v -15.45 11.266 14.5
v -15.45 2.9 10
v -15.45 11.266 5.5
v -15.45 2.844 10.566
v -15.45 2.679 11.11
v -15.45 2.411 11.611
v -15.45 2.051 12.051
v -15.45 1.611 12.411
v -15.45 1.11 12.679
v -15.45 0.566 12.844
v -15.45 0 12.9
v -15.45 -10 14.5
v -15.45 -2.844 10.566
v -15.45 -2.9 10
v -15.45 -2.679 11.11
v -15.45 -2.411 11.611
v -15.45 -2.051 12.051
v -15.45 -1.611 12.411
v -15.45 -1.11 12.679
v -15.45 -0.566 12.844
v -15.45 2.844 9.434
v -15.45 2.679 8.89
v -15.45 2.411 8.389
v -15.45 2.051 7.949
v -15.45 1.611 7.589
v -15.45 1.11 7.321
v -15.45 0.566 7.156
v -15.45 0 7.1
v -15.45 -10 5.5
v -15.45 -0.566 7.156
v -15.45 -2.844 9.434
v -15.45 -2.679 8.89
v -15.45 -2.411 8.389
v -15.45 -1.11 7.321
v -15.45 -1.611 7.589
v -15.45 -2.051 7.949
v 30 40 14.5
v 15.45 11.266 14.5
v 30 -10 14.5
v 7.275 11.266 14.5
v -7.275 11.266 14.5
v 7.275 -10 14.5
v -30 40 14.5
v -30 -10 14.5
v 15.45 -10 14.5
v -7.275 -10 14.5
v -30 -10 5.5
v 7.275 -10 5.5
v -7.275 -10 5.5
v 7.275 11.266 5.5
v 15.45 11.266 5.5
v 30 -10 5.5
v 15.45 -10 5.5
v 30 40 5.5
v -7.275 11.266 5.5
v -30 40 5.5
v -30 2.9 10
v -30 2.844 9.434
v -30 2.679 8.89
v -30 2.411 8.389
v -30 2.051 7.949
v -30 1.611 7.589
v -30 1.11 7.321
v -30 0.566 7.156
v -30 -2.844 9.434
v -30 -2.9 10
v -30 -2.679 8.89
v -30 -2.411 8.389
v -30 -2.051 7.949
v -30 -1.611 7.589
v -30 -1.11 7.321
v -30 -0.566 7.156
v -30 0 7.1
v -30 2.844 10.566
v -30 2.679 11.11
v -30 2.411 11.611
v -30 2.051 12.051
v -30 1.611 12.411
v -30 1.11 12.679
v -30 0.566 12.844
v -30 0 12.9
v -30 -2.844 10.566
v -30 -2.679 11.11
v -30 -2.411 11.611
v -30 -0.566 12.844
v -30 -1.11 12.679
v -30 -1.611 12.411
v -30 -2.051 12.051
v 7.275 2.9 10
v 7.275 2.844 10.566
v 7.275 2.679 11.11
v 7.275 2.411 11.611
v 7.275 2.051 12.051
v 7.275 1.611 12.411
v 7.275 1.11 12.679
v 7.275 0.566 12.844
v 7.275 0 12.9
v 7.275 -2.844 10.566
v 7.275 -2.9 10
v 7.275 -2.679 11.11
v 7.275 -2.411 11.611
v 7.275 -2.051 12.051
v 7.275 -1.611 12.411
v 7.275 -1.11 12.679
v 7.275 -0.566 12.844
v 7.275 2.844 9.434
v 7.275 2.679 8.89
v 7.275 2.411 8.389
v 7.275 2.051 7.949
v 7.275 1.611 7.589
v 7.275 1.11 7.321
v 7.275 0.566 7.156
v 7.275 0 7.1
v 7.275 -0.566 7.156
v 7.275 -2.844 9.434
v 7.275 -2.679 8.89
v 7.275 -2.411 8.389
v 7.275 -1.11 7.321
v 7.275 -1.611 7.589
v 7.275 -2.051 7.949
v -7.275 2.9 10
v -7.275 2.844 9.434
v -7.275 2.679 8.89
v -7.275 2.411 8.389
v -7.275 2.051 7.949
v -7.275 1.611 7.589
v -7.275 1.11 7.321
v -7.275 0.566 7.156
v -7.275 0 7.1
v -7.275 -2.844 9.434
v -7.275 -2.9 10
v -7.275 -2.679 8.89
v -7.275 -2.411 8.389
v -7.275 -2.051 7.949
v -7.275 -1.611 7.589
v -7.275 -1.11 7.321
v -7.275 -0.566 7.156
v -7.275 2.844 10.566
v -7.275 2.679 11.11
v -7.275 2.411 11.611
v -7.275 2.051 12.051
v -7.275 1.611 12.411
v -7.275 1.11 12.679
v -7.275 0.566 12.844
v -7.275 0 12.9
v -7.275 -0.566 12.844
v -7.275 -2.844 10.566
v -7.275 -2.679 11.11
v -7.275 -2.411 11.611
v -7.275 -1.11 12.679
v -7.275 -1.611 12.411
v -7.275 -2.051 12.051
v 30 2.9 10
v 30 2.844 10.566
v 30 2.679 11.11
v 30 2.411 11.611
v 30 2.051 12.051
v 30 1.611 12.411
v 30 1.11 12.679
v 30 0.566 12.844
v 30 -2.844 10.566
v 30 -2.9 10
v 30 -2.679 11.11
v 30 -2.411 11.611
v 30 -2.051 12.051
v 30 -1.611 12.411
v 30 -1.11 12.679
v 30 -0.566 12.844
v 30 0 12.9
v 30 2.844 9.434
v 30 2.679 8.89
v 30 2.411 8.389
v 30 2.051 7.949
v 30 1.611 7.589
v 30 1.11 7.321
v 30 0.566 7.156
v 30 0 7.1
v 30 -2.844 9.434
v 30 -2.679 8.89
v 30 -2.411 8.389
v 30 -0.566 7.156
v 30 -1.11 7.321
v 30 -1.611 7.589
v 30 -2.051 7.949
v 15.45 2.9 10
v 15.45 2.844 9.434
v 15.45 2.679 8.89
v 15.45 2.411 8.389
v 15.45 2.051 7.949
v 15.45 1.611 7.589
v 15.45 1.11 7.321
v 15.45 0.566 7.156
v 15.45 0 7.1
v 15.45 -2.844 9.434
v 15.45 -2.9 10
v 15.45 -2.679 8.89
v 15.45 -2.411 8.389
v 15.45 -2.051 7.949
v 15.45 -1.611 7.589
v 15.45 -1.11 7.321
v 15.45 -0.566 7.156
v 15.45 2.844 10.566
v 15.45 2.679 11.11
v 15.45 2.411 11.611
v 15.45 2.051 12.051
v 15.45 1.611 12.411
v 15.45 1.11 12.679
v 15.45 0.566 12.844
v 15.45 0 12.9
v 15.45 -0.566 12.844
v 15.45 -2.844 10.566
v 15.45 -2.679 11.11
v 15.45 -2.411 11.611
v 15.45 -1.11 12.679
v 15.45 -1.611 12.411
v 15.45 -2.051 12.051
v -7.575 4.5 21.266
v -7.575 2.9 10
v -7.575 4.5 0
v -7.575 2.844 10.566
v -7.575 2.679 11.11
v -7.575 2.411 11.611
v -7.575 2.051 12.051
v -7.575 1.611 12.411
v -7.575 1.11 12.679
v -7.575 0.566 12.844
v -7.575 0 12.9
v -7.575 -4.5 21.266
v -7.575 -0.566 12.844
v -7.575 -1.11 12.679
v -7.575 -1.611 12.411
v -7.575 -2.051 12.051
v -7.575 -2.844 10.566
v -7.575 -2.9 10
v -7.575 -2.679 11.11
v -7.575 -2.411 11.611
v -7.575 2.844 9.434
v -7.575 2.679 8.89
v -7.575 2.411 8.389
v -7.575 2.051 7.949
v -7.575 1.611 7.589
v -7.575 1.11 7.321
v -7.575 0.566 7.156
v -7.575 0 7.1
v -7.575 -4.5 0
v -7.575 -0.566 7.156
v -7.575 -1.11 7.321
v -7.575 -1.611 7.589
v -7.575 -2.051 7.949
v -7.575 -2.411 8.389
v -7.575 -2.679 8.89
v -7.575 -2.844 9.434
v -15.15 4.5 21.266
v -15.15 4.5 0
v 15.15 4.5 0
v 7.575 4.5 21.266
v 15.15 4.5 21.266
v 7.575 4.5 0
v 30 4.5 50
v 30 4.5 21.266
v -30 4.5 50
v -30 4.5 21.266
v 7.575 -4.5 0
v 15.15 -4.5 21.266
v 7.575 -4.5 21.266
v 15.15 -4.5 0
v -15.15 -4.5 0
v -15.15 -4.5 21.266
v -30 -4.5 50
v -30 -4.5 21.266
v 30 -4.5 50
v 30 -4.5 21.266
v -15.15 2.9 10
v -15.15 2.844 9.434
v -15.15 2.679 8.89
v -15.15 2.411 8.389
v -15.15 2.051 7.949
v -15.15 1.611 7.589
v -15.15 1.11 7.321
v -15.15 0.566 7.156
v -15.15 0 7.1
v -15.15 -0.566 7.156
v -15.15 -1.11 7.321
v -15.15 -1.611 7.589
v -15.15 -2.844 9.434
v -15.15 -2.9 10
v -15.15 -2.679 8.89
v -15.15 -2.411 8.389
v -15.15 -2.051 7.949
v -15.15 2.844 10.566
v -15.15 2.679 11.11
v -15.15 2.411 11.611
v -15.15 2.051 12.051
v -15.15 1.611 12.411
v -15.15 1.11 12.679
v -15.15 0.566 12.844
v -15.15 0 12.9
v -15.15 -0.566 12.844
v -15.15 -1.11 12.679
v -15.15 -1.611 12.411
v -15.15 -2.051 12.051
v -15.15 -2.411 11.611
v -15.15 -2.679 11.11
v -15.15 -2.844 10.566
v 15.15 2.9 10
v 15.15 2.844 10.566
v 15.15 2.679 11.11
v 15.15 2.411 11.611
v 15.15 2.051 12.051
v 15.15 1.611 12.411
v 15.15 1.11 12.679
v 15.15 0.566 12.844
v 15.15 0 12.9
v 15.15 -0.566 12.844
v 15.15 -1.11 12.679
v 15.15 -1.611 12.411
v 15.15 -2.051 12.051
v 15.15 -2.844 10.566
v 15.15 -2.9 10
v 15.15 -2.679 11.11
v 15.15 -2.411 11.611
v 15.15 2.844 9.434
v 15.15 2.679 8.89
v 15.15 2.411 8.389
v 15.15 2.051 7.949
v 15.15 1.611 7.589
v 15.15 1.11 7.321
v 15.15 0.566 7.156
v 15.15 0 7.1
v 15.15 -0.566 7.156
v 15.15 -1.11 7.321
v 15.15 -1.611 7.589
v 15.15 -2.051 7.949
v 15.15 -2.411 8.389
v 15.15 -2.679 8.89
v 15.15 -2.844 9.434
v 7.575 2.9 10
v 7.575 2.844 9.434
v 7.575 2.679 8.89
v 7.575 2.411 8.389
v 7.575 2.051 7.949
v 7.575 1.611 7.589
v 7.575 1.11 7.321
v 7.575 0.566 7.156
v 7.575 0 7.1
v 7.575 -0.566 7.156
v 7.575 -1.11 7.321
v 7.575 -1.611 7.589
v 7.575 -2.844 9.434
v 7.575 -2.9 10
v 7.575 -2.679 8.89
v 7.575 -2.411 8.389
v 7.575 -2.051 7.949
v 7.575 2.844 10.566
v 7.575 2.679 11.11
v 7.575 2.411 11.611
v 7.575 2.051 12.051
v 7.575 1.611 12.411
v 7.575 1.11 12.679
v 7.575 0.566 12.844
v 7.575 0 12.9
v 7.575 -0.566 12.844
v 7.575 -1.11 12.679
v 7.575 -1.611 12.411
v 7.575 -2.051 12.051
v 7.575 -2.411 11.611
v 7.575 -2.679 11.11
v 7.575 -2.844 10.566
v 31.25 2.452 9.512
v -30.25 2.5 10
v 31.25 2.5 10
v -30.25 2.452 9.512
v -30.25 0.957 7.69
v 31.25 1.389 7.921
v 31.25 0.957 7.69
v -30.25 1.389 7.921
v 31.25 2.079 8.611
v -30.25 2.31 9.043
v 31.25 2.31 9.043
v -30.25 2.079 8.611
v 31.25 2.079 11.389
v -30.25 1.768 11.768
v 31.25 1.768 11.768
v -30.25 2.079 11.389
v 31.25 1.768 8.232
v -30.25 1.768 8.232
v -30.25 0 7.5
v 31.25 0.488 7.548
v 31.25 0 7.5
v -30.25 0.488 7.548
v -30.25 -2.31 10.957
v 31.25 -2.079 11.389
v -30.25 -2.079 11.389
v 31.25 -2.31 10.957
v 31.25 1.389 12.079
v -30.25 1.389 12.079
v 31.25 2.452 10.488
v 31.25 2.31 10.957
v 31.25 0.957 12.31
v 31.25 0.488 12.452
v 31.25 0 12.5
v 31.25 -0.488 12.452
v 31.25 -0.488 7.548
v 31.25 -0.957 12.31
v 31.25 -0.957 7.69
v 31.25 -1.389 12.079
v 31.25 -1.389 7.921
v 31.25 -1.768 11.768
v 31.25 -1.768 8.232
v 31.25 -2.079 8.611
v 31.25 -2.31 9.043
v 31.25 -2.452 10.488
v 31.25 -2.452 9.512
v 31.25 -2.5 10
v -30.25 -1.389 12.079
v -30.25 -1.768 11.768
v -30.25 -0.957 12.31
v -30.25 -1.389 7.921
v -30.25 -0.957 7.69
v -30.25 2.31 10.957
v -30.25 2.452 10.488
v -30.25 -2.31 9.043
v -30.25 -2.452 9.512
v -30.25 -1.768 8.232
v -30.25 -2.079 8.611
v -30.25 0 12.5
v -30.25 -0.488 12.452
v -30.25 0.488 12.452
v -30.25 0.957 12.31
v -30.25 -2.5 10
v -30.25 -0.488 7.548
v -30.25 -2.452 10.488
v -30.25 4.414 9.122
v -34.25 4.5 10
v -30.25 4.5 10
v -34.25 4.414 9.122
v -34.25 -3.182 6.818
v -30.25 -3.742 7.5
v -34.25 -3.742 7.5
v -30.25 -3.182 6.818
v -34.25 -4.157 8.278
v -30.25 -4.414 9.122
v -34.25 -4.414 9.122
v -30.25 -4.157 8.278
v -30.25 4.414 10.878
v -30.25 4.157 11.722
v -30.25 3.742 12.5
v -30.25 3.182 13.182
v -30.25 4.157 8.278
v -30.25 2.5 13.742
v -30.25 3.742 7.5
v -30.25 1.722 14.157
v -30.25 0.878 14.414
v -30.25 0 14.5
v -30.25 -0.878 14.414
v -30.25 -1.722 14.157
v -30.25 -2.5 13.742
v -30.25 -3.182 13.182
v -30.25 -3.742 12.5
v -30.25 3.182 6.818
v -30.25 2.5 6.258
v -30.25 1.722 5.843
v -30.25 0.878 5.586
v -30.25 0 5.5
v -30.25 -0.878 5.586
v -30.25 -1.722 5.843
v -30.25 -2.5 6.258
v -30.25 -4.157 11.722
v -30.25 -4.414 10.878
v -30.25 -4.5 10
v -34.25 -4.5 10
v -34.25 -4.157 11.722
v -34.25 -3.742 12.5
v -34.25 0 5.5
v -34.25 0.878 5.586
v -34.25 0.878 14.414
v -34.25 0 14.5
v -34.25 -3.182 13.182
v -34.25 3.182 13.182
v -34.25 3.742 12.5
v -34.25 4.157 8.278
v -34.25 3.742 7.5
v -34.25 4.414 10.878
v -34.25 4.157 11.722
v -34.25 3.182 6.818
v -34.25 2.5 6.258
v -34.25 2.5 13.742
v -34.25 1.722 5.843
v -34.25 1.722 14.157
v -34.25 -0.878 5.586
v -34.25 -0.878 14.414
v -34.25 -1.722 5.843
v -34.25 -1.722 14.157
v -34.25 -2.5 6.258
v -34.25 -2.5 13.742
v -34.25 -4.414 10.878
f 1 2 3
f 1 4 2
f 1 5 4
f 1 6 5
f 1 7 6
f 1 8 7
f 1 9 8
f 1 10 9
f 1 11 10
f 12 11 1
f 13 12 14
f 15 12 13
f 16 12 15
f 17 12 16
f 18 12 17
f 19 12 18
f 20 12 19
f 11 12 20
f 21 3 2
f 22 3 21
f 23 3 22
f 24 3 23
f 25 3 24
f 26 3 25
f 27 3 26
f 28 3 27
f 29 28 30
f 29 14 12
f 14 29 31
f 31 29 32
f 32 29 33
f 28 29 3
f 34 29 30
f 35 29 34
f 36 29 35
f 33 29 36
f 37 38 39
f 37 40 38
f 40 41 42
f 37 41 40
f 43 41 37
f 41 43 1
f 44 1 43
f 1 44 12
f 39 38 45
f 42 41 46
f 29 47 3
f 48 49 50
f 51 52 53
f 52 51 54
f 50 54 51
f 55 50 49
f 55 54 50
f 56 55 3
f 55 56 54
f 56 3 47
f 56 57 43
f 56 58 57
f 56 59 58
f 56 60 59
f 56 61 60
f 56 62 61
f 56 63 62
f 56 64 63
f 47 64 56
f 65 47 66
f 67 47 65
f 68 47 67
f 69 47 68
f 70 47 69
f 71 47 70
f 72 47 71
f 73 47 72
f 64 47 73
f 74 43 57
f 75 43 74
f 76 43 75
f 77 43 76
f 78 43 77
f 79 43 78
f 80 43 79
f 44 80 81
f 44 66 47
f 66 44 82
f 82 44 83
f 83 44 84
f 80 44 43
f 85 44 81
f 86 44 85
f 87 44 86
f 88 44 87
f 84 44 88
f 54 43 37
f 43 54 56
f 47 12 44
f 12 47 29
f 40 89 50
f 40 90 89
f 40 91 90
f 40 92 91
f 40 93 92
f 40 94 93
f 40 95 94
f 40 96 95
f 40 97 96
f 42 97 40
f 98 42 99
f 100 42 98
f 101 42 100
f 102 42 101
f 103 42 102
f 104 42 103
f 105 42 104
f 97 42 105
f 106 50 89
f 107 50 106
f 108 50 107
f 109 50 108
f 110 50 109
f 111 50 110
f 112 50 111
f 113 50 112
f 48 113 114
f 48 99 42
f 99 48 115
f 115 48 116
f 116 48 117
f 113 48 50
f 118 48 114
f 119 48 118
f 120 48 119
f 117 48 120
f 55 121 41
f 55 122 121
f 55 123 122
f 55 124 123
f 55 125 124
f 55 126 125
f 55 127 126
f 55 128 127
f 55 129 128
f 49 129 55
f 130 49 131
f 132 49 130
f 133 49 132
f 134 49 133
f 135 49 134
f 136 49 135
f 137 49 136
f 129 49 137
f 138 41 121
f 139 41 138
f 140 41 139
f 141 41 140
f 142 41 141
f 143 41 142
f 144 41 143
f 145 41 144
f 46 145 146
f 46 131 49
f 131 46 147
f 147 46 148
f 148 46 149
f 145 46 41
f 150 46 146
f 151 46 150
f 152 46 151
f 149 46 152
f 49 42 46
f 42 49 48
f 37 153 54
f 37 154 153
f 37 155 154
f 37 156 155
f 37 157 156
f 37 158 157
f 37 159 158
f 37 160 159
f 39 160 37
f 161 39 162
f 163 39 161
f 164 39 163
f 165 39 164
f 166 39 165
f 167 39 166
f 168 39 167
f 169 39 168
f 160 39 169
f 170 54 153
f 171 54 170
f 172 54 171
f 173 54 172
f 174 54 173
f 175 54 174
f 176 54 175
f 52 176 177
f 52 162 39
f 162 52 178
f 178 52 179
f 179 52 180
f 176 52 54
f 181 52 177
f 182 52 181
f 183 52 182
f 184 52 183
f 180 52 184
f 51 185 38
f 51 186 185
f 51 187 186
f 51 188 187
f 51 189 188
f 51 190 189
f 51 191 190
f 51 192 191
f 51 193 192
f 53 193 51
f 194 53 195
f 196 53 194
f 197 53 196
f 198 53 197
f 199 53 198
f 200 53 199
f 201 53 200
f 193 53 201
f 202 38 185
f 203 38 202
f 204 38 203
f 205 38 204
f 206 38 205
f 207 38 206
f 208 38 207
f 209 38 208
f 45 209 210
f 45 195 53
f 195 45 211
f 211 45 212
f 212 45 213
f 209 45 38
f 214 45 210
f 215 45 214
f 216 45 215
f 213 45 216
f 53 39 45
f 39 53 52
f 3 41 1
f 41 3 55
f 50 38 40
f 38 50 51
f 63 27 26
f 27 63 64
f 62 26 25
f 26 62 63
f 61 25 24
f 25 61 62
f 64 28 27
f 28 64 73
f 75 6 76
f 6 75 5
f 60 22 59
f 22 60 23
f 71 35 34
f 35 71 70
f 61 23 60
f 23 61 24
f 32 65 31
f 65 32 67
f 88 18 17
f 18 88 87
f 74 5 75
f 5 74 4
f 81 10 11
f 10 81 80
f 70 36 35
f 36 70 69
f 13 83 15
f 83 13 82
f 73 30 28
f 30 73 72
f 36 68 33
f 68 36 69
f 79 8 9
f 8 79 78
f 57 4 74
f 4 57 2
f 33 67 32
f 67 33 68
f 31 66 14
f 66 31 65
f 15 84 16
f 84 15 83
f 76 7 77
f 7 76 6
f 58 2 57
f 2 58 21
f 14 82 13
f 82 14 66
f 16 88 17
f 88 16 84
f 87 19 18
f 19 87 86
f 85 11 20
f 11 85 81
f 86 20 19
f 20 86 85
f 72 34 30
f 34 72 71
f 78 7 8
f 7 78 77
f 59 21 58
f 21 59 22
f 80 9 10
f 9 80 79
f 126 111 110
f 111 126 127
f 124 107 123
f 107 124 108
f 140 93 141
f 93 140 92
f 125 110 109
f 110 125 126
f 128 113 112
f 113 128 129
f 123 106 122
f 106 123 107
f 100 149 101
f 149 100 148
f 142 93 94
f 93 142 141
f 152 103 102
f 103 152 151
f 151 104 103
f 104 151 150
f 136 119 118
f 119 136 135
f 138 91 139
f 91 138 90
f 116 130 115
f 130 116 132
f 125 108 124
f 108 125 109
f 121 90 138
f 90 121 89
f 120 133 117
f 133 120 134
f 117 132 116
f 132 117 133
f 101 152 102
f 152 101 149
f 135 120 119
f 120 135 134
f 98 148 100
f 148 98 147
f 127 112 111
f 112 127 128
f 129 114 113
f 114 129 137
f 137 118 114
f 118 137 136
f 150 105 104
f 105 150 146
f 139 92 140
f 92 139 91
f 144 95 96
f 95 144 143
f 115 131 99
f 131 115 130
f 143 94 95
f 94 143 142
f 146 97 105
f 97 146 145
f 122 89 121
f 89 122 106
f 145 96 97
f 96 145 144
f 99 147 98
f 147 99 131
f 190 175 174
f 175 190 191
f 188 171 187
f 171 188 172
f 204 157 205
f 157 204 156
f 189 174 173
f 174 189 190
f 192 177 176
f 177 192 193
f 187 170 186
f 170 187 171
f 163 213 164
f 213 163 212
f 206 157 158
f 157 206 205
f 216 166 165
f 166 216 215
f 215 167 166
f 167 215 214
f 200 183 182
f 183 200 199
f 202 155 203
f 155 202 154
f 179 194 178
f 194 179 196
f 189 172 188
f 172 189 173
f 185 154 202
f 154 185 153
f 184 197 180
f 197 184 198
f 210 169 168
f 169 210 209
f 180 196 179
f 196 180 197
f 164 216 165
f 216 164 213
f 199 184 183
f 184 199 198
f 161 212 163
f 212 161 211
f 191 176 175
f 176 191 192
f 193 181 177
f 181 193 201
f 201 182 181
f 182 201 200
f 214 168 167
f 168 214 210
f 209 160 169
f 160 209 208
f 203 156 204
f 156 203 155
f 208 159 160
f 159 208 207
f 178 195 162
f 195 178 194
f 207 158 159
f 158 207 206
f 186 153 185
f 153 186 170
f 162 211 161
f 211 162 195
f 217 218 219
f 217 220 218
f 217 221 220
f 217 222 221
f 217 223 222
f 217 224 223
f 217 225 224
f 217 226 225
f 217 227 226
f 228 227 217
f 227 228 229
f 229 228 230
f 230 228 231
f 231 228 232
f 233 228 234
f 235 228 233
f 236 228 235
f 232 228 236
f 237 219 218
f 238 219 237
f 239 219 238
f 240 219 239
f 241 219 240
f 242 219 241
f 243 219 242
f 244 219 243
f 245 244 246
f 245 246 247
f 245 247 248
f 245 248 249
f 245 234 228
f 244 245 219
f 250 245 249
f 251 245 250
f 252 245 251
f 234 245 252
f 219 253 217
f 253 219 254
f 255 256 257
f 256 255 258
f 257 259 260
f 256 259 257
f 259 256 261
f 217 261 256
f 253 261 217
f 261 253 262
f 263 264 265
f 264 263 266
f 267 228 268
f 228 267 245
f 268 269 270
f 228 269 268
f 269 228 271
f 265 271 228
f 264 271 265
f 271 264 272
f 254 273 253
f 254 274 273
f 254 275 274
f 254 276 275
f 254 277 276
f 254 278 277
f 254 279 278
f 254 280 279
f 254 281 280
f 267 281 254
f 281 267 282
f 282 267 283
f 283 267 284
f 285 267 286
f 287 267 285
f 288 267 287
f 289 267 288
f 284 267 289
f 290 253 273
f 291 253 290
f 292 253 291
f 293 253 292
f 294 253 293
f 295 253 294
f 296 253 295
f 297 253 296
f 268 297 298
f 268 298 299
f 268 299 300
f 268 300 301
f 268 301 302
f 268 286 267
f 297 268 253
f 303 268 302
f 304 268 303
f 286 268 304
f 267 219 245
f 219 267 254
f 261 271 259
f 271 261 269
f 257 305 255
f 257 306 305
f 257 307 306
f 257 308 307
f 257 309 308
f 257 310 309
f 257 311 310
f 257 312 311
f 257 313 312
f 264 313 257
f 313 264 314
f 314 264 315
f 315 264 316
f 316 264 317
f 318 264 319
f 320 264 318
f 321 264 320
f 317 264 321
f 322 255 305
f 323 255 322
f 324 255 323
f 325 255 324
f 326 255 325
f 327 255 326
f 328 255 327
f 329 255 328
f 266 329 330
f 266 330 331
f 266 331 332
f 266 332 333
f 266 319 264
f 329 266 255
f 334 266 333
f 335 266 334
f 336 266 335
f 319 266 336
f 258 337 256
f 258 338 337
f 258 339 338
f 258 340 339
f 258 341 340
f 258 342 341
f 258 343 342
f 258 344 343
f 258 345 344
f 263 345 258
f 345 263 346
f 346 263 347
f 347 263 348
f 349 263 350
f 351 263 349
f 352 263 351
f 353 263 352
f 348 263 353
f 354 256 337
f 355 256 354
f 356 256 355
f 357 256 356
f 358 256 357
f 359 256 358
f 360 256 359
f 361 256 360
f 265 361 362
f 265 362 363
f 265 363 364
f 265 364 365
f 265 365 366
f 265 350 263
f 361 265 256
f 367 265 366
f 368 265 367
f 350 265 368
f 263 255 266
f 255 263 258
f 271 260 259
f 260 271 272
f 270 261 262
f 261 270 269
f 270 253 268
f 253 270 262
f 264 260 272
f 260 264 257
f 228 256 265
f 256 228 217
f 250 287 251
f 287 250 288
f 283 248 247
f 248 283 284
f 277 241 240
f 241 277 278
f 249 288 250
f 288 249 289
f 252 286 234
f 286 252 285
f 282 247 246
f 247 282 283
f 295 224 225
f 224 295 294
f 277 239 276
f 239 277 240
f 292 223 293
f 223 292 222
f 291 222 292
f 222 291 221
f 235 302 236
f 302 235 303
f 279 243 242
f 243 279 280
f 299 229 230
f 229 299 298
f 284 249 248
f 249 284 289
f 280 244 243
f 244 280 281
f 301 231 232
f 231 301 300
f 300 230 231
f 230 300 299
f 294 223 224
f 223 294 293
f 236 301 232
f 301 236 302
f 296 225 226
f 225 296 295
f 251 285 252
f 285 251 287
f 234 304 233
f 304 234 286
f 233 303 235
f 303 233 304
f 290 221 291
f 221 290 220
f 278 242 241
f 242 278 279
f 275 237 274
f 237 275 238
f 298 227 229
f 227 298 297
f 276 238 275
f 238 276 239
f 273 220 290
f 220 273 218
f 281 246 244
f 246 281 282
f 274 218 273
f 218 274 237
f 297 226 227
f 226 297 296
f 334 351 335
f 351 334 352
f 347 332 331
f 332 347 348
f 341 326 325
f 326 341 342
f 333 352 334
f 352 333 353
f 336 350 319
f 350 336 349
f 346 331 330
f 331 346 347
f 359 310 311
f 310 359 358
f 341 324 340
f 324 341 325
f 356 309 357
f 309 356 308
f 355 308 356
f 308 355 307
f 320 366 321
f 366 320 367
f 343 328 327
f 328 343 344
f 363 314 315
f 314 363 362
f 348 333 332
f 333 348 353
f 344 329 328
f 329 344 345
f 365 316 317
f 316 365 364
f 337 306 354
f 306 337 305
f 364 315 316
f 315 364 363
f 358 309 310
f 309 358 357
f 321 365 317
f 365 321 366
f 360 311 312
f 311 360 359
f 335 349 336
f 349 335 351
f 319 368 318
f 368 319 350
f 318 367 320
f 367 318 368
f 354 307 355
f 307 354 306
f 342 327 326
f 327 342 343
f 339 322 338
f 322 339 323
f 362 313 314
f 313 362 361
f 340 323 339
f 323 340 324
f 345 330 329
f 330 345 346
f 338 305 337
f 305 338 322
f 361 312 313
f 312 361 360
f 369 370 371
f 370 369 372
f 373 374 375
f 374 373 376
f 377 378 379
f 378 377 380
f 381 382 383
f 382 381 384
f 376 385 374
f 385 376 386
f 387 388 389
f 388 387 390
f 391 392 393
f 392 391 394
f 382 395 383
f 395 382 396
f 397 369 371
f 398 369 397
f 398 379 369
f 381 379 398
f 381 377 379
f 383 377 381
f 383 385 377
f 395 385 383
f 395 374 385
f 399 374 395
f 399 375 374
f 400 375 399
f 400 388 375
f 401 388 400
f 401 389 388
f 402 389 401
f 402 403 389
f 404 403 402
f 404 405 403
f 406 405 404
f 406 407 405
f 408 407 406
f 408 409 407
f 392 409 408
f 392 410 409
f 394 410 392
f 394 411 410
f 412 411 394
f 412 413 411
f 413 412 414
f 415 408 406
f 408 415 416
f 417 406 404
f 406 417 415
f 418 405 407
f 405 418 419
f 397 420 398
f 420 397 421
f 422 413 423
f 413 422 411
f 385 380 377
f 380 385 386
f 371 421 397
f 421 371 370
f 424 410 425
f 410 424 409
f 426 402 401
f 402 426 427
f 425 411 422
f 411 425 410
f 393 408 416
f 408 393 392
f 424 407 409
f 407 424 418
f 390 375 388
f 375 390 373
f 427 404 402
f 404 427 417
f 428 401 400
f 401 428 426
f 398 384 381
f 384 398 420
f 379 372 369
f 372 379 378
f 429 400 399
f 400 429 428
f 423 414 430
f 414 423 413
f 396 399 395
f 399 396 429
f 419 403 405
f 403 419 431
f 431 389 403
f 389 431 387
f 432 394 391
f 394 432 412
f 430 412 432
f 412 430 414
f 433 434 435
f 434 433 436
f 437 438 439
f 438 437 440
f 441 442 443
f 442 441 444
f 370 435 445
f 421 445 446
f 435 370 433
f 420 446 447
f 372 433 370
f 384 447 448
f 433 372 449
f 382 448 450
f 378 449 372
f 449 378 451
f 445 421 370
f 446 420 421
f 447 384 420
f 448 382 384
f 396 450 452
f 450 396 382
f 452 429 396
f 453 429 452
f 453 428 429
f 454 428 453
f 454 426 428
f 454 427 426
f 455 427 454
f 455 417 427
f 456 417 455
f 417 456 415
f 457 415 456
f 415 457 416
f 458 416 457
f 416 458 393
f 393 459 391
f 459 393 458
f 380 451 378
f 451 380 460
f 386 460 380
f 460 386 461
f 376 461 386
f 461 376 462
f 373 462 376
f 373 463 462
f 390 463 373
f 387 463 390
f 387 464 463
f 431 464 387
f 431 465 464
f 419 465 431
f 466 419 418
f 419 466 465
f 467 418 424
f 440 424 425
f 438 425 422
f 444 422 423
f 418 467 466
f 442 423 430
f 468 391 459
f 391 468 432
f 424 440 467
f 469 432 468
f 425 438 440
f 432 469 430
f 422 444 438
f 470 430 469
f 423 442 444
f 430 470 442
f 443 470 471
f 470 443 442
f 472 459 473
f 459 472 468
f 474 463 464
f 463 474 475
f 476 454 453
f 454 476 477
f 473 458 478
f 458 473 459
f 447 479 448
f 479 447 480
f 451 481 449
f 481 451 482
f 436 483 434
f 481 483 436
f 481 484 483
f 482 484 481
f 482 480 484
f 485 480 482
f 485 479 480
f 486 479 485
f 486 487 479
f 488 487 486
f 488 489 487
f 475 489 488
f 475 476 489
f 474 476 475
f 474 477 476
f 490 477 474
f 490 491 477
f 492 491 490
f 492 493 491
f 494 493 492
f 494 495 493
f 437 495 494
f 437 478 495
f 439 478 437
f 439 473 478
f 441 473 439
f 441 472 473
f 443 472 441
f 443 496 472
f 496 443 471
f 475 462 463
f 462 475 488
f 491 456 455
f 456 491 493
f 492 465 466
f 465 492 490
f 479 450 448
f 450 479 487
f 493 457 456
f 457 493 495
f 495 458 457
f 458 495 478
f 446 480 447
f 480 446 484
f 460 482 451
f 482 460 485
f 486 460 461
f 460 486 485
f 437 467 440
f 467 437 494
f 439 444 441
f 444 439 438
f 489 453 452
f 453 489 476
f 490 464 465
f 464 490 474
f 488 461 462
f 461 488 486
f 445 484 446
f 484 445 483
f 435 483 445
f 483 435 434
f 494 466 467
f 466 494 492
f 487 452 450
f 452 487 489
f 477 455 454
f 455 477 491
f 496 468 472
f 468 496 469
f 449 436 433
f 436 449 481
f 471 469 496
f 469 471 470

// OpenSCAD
$fn = 32;

// ------------------------------------------------------------------------
// Butt hinge: hinge 60 mm, leaf swung 270 deg
// Every part is its own module, assembly() places every instance.
// ------------------------------------------------------------------------

// --- part 1 ---
module hinge_base() {
  difference() {
    union() {
      translate([-30, -10, -4.5]) cube([14.55, 50, 9]);
      translate([-7.275, -10, -4.5]) cube([14.55, 50, 9]);
      translate([15.45, -10, -4.5]) cube([14.55, 50, 9]);
      translate([-30, 11.266, -4.5]) cube([60, 28.734, 9]);
    }
    translate([-22.725, 0, 0]) rotate([0, 90, 0]) cylinder(h = 16.55, d = 5.8, center = true);
    translate([0, 0, 0]) rotate([0, 90, 0]) cylinder(h = 16.55, d = 5.8, center = true);
    translate([22.725, 0, 0]) rotate([0, 90, 0]) cylinder(h = 16.55, d = 5.8, center = true);
  }
}

// --- part 2 ---
module hinge_mover() {
  difference() {
    union() {
      translate([-15.15, -40, -4.5]) cube([7.575, 50, 9]);
      translate([7.575, -40, -4.5]) cube([7.575, 50, 9]);
      translate([-30, -40, -4.5]) cube([60, 28.734, 9]);
    }
    translate([-11.362, 0, 0]) rotate([0, 90, 0]) cylinder(h = 9.575, d = 5.8, center = true);
    translate([11.362, 0, 0]) rotate([0, 90, 0]) cylinder(h = 9.575, d = 5.8, center = true);
  }
}

// --- part 3 ---
module hinge_pin() {
  rotate([0, 90, 0]) cylinder(h = 62.5, d = 5, center = true);
  translate([-34.25, 0, 0]) rotate([0, 90, 0]) cylinder(h = 4, d = 9);
}

// --- assembly ---
module assembly() {
  color([0.80, 0.24, 0.20]) translate([0, 0, 10]) rotate([0, 0, 0]) hinge_base();
  color([0.20, 0.45, 0.75]) translate([0, 0, 10]) rotate([270, 0, 0]) hinge_mover();
  color([0.25, 0.62, 0.32]) translate([0, 0, 10]) rotate([0, 0, 0]) hinge_pin();
}

assembly();
